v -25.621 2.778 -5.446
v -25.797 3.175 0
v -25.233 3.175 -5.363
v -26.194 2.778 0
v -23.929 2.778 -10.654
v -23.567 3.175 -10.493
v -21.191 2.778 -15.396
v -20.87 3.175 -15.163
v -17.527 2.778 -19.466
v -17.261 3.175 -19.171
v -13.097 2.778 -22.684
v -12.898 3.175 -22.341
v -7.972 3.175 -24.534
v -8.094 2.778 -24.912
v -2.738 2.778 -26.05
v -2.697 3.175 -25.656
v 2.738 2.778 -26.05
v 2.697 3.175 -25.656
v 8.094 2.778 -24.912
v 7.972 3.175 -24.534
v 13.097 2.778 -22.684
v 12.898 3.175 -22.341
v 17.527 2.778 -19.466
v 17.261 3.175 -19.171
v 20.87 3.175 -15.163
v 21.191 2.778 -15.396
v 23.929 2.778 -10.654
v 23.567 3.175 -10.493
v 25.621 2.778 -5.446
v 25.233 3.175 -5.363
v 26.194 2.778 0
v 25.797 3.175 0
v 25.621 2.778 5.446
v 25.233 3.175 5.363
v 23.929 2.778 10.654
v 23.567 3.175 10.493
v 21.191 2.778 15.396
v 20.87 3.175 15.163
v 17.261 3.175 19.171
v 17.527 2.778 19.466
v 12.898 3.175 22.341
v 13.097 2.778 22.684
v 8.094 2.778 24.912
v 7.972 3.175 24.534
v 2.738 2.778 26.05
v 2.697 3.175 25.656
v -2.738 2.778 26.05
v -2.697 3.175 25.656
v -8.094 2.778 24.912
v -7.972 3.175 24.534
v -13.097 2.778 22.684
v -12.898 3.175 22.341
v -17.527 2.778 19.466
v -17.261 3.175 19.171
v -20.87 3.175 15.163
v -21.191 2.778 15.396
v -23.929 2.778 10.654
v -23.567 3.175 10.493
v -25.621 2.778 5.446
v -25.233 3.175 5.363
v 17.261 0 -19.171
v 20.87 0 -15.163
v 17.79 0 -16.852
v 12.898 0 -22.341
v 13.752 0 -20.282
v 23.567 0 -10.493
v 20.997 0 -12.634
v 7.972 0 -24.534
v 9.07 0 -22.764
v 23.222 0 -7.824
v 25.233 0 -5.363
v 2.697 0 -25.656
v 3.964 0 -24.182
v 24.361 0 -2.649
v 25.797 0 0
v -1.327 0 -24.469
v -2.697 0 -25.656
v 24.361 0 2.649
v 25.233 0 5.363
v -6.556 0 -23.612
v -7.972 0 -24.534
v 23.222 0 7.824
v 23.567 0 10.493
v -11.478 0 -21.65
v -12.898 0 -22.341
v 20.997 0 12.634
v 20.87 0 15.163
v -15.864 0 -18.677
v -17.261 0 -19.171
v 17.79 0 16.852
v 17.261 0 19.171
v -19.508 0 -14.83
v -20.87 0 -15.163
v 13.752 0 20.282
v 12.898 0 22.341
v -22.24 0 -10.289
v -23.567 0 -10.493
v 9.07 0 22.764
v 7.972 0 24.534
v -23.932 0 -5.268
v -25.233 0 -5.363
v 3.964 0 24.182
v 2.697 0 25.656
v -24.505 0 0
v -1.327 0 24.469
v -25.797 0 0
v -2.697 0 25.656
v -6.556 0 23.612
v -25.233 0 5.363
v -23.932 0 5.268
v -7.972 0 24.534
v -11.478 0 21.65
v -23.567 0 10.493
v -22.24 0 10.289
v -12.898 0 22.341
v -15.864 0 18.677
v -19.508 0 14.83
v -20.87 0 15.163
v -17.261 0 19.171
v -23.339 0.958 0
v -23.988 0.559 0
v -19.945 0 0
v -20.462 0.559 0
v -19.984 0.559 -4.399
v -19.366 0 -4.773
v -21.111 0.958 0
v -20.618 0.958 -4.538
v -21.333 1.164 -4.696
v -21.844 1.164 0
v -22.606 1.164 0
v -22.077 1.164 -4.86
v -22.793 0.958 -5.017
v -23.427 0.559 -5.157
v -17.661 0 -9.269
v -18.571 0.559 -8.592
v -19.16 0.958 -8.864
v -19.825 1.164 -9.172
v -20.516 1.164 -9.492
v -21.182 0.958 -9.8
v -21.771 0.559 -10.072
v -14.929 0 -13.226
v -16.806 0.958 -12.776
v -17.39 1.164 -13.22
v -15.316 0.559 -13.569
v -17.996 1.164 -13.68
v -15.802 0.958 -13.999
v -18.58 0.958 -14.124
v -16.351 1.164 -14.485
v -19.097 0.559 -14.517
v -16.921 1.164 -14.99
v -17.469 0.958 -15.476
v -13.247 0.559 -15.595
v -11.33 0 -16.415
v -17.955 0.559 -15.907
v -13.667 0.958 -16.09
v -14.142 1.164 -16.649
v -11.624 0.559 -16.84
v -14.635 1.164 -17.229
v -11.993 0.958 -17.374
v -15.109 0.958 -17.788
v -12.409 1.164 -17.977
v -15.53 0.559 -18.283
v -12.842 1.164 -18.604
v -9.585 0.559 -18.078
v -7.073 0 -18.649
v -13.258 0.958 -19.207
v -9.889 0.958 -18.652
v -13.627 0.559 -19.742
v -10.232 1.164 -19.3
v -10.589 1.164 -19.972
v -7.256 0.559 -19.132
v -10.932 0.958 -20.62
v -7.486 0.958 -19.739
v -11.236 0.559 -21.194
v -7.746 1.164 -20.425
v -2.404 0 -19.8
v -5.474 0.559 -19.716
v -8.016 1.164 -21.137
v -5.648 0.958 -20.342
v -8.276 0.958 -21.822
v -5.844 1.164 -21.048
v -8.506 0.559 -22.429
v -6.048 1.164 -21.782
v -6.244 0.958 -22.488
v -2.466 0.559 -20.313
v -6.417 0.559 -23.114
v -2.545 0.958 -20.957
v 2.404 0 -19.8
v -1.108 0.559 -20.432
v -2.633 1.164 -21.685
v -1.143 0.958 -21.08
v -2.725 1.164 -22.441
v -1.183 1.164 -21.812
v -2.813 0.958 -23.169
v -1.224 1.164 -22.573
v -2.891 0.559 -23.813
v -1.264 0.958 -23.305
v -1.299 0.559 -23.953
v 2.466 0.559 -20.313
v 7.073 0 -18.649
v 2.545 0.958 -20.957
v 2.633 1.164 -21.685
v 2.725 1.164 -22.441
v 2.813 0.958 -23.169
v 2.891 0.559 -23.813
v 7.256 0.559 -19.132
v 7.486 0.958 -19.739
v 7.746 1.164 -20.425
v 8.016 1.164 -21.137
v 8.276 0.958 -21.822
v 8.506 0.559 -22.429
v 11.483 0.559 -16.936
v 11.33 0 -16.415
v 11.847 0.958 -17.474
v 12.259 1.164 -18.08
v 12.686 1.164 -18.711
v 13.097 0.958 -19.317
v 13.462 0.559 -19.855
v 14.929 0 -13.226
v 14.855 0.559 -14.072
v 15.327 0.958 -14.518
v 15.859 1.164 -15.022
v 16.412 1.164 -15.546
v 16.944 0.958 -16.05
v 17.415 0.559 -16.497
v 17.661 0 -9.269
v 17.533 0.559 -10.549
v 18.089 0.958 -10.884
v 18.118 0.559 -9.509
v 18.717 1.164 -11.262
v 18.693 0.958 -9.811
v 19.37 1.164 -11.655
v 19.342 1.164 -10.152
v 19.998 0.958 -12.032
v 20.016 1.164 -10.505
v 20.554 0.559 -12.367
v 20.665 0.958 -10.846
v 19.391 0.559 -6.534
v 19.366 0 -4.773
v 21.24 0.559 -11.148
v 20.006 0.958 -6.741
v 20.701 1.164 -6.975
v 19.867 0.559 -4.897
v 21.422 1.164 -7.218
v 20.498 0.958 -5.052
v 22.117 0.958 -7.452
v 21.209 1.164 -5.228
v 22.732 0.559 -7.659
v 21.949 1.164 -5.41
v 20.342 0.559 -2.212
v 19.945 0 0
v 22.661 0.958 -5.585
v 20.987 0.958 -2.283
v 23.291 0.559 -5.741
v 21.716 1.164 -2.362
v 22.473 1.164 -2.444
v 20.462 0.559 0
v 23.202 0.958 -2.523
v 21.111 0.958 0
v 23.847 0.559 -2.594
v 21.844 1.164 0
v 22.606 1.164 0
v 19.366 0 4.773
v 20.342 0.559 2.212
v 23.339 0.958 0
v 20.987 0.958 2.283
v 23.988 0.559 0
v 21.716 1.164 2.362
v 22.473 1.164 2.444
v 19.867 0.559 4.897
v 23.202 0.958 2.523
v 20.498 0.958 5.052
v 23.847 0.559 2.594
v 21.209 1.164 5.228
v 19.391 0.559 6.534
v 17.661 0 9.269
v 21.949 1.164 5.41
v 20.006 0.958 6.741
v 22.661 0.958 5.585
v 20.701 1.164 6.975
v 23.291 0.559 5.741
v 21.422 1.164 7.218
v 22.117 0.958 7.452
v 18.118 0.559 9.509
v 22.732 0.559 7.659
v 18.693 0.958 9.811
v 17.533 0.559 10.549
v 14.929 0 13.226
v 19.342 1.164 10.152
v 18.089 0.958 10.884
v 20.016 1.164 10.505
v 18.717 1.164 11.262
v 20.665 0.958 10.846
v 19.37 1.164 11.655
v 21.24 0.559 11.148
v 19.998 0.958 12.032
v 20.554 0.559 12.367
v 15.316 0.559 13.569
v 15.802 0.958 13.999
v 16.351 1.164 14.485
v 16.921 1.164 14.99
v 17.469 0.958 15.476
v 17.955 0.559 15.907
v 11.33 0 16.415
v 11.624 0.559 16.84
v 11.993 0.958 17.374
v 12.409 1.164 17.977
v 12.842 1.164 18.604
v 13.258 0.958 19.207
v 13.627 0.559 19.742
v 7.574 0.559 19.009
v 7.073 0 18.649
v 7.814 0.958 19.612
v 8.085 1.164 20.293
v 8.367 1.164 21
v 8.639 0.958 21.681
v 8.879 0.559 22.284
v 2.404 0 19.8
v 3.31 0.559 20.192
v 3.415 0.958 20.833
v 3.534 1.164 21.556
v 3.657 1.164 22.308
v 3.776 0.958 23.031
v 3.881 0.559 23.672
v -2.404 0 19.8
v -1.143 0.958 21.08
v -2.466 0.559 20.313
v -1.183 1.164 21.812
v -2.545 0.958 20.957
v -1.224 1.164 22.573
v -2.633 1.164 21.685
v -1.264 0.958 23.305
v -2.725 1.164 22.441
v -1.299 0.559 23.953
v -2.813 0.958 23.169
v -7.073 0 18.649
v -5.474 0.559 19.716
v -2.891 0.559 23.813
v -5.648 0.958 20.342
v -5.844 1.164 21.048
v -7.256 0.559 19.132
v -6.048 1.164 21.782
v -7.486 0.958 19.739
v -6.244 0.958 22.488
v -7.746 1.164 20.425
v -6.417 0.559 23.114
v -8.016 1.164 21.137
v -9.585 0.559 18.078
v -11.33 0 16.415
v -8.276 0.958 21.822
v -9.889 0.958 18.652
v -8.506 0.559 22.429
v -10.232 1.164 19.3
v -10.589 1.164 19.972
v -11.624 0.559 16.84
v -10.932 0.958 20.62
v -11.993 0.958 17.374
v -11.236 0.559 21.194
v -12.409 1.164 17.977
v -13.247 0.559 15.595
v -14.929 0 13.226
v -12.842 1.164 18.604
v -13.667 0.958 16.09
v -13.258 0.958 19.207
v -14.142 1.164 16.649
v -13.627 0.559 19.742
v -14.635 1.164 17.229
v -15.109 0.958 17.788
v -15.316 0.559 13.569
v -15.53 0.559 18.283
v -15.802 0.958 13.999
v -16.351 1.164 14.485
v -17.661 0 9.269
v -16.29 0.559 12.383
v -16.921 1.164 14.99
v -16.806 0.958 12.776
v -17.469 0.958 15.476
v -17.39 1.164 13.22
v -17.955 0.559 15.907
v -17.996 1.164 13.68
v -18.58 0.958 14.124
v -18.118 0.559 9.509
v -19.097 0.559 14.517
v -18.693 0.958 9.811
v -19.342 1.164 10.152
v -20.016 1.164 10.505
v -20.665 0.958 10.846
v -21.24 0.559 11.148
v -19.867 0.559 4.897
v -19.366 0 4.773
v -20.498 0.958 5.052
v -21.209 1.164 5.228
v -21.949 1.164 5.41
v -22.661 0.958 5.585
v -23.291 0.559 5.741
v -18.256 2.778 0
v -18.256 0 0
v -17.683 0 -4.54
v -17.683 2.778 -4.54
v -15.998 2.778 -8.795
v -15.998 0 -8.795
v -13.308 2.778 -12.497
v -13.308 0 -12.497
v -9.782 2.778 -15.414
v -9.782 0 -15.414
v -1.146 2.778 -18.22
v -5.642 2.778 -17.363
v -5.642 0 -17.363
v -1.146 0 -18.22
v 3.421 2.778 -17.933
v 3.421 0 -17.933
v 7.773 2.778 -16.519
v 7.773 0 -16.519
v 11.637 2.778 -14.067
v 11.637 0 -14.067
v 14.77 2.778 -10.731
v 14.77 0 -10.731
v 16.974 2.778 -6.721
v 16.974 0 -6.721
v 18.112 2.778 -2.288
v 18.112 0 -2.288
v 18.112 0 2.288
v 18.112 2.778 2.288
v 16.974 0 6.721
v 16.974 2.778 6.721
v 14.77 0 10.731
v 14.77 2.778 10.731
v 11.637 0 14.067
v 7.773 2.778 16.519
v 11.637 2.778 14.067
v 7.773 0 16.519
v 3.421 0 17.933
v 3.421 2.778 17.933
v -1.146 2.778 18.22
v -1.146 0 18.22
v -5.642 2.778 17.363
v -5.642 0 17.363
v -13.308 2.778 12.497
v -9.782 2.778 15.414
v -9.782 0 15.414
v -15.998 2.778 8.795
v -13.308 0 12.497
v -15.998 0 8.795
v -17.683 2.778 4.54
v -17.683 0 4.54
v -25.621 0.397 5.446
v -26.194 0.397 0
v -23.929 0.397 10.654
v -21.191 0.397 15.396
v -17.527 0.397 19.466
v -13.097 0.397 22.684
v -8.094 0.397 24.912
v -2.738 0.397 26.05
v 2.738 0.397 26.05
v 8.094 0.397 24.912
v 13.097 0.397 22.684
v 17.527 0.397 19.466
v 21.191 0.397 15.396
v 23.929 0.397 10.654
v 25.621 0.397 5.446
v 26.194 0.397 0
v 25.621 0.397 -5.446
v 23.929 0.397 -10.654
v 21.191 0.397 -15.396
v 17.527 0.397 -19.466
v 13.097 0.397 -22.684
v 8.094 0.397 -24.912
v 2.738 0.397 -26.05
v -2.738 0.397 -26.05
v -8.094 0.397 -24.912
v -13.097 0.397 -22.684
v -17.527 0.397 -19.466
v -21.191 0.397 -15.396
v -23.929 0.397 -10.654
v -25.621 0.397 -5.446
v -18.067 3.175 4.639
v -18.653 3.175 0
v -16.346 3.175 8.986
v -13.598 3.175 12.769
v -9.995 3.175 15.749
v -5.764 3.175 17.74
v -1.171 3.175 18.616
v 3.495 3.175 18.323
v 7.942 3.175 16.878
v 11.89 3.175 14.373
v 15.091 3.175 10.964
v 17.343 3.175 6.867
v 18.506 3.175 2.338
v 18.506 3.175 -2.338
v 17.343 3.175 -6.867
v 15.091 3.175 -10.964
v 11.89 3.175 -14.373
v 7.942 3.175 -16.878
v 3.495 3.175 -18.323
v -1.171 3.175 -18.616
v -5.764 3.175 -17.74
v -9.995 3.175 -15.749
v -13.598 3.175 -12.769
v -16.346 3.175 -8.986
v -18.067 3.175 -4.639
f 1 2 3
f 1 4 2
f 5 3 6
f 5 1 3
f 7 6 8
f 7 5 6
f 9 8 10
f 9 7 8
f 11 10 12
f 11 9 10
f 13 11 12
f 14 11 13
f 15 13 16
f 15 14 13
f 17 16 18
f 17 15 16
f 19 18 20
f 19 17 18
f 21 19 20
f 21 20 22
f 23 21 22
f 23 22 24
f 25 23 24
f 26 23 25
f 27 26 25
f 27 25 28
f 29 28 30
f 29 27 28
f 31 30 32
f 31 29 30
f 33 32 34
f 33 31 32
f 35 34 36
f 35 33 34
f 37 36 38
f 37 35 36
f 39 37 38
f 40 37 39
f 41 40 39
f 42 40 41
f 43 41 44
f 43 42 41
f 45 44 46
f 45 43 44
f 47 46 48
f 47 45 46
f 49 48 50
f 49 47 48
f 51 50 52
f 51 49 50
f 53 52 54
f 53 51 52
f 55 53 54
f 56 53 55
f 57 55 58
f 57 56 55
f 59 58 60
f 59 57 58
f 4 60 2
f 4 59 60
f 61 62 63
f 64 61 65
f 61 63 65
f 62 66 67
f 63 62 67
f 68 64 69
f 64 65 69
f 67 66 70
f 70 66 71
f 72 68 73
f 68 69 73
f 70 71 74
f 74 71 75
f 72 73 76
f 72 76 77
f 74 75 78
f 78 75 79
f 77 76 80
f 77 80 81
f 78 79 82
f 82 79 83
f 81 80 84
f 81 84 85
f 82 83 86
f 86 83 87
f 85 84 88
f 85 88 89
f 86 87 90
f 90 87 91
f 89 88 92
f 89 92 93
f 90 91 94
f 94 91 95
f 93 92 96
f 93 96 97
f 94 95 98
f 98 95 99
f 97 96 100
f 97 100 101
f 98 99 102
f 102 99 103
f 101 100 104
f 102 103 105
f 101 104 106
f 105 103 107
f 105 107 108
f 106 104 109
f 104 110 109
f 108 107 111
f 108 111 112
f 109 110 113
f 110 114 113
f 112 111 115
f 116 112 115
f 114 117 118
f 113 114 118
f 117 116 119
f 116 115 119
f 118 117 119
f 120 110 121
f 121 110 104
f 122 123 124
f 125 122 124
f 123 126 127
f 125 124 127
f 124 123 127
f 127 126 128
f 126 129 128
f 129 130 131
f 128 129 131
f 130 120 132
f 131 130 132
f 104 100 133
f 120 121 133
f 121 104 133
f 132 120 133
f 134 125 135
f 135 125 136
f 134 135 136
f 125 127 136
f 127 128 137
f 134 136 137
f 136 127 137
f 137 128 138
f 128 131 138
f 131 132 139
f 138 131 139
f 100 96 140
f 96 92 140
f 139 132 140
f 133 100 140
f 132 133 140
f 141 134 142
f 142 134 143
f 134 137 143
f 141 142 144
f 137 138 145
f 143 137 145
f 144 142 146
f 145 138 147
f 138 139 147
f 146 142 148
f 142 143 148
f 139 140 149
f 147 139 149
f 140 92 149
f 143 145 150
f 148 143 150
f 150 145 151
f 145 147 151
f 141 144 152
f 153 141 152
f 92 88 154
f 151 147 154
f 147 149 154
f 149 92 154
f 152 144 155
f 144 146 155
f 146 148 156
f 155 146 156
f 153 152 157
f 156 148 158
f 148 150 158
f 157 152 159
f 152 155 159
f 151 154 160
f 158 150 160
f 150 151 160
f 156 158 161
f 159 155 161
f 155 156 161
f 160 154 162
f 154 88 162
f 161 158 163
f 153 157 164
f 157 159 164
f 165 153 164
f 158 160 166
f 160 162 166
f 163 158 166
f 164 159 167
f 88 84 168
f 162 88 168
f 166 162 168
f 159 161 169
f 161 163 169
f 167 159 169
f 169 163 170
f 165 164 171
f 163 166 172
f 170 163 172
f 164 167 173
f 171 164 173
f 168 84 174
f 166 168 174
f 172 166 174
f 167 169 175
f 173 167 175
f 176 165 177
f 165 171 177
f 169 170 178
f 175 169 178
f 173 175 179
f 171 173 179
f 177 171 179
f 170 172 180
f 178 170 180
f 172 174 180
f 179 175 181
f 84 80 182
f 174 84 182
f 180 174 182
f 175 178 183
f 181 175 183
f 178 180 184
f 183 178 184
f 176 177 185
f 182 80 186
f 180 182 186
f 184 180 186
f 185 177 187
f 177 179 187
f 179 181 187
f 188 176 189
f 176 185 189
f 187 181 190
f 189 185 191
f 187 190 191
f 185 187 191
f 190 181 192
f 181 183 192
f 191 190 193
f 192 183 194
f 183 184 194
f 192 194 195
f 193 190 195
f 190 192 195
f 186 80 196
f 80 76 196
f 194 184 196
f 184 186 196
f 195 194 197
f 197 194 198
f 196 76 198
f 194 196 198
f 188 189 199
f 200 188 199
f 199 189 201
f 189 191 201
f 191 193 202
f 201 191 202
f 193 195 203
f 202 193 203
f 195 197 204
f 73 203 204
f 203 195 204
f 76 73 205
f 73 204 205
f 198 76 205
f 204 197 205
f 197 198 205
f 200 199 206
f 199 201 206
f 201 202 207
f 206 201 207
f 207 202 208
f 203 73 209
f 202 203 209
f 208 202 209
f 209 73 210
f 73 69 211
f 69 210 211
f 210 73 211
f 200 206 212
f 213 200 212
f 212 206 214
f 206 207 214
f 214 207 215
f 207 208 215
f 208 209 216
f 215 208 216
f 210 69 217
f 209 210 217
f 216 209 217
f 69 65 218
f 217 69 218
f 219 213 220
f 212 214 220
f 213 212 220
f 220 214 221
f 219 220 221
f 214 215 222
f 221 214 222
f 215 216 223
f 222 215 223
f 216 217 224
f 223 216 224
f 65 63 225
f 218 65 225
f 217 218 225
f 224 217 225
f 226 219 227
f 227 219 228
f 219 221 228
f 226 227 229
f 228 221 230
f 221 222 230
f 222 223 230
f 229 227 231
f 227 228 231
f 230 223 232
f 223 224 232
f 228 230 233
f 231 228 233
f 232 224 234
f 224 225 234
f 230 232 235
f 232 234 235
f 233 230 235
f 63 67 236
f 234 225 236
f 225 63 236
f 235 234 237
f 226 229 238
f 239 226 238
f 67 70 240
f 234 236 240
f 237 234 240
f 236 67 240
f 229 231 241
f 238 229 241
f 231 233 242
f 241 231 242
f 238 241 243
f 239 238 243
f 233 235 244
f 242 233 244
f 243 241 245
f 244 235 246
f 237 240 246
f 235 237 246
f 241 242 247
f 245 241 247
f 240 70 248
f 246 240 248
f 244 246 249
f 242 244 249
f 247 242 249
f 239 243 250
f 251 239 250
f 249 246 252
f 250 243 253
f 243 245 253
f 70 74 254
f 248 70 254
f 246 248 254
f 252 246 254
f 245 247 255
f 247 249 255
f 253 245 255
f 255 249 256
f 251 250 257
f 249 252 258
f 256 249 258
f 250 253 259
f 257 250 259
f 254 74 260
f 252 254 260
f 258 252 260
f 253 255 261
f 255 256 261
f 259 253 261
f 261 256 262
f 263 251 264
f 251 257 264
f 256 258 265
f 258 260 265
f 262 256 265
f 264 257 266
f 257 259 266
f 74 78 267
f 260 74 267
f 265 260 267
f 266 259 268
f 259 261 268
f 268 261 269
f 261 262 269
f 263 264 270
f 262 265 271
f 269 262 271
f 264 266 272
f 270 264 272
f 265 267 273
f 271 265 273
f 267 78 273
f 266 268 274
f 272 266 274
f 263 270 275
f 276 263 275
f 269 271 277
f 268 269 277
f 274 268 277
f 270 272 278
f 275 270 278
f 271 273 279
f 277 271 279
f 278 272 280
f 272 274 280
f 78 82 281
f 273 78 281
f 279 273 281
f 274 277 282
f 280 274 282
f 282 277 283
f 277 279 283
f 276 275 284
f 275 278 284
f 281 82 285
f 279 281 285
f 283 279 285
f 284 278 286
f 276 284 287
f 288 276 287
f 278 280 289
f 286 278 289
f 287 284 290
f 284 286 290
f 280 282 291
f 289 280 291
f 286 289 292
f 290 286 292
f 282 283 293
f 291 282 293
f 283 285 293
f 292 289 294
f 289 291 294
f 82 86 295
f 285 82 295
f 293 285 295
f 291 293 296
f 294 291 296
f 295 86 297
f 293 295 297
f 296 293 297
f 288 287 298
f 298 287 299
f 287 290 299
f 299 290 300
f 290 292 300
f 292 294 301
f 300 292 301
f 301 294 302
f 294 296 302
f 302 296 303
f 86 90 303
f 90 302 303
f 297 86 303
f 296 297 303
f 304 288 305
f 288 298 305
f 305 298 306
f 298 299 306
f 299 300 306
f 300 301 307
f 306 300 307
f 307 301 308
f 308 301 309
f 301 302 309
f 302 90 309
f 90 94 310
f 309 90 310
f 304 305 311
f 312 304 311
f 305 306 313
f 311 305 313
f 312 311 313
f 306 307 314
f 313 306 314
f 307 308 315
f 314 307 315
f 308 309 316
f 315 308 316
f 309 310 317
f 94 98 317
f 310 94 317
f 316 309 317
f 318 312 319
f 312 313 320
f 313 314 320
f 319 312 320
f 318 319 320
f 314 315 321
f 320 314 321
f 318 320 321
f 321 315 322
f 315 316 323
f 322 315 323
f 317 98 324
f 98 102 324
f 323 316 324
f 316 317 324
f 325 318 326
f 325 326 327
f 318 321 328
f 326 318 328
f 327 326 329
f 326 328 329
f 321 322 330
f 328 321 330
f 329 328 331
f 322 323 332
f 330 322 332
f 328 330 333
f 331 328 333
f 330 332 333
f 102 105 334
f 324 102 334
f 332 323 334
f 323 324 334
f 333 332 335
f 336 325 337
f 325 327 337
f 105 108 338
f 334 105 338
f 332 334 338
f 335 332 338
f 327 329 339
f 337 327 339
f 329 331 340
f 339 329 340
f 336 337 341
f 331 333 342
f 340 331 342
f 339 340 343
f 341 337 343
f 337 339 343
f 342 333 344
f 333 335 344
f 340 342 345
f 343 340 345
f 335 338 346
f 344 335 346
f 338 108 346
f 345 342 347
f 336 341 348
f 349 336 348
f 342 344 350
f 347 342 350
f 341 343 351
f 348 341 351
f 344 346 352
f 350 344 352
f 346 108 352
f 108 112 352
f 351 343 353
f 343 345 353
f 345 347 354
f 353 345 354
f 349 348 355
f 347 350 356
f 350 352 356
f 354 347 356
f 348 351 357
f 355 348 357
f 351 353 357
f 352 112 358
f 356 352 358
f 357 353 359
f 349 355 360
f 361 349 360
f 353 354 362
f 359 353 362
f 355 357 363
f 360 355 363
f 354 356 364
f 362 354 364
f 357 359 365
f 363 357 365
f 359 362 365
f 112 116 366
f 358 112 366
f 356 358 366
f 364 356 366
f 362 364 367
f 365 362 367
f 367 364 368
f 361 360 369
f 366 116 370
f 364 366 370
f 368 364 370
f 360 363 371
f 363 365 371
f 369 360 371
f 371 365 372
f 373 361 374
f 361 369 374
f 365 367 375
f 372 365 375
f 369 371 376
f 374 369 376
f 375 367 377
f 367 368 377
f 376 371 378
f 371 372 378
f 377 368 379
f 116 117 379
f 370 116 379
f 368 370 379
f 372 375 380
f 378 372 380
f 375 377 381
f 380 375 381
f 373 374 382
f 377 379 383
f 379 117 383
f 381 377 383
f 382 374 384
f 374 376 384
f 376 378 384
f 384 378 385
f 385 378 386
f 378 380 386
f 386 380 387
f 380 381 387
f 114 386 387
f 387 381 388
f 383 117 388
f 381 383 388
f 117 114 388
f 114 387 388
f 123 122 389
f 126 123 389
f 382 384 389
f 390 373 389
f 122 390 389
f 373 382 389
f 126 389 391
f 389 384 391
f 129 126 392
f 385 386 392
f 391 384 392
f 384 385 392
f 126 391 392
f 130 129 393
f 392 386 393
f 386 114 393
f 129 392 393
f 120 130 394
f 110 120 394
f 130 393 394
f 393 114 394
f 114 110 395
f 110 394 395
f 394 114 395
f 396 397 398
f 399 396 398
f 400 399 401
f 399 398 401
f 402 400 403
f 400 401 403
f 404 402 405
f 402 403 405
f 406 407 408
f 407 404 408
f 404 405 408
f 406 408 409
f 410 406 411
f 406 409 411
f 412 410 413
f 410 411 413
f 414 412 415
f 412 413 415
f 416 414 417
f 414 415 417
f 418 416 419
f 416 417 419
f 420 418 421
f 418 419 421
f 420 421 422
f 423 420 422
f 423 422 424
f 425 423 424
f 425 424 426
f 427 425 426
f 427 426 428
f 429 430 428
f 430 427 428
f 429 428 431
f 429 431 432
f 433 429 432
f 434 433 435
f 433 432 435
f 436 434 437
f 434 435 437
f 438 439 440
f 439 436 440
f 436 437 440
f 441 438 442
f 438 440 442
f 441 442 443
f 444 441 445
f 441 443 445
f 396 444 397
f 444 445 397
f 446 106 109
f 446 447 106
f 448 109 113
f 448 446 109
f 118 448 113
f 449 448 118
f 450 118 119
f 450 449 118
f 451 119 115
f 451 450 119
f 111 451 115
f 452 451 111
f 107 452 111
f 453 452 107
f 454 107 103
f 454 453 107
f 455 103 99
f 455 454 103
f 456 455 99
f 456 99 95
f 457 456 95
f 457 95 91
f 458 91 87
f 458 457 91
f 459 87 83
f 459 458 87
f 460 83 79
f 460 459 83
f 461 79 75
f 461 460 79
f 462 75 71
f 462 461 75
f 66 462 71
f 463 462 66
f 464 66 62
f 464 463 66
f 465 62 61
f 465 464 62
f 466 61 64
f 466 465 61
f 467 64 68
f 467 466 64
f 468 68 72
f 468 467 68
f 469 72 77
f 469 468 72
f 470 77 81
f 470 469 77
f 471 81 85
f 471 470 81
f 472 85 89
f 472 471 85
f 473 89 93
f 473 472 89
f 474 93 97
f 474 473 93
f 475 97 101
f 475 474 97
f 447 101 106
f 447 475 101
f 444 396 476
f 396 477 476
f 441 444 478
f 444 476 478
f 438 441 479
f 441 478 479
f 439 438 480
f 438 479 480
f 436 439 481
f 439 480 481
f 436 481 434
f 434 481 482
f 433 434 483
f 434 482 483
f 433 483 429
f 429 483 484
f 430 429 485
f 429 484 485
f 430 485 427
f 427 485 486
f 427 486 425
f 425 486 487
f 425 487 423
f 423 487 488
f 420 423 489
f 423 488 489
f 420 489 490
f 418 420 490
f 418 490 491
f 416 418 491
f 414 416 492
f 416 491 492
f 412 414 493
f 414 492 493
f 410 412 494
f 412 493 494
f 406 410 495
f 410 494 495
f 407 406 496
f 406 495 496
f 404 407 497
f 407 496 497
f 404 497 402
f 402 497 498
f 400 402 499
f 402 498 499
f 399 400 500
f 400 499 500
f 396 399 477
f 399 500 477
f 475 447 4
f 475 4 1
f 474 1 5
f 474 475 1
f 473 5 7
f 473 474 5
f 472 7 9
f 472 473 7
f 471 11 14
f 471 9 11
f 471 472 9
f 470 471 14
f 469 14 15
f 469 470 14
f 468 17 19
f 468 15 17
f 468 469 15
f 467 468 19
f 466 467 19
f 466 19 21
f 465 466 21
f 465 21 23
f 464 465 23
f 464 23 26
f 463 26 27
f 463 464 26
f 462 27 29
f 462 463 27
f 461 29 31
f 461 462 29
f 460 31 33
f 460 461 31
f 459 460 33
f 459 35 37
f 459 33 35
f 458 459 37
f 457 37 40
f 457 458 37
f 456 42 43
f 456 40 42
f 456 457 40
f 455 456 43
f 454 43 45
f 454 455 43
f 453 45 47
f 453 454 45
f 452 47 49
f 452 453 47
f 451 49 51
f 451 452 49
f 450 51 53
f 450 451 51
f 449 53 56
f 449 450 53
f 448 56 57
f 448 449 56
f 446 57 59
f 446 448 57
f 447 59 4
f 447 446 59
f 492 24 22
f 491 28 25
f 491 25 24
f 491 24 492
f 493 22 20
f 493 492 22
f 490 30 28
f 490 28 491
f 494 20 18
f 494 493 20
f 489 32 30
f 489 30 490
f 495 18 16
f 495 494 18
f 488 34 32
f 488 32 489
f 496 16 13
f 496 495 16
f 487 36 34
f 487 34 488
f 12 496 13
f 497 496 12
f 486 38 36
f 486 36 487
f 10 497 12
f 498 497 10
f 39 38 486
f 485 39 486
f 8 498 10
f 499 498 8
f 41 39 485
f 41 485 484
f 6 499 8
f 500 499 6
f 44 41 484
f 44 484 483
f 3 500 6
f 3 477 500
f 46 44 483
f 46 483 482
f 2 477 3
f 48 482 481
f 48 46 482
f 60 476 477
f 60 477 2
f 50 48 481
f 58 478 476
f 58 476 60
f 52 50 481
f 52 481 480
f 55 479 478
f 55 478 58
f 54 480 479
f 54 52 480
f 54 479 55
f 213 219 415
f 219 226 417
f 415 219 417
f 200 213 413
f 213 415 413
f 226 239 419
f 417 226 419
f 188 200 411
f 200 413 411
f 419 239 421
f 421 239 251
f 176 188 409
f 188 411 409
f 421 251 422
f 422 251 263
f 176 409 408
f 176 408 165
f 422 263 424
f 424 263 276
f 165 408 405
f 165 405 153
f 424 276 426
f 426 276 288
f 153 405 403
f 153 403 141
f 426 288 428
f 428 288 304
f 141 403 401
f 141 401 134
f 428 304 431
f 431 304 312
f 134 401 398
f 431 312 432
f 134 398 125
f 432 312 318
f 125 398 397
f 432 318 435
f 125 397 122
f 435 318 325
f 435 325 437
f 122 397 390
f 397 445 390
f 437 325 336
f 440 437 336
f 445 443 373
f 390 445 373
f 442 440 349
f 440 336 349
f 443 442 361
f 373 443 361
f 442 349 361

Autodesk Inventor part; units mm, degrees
ref_plane "YZ Plane" through (0, 0, 0) normal (1, 0, 0) x (0, 1, 0)
ref_plane "XZ Plane" through (0, 0, 0) normal (0, 1, 0) x (-1, 0, 0)
ref_plane "XY Plane" through (0, 0, 0) normal (0, 0, 1) x (1, 0, 0)
sketch "Sketch1" plane through (0, 0, 0) normal (0, 1, 0) x (-1, 0, 0)
  circle A0 centre (0, 0) radius 26.1938
  circle A1 centre (0, 0) radius 18.2563
  dimension "d0" = 52.3875
  dimension "d1" = 36.5125
extrude "Extrusion1" add sketch "Sketch1" along normal blind 3.175
sketch "Sketch2" plane through (0, 0, 0) normal (0, 0, 1) x (1, 0, 0)
  line L0 (-22.225, 0) -> (-22.225, -1.5875)
  circle A0 centre (-22.225, -1.5875) radius 2.7781
  line L1 (0, 0) -> (0, 3.175)
  line L2 (26.1938, 3.175) -> (-26.1938, 3.175) projected
  dimension "d4" = 1.5875
  dimension "d5" = 5.5563
revolve "Revolution1" cut sketch "Sketch2" angle 360 about axis through (0, 0, 0) along (0, 1, 0)
chamfer "Chamfer1" distance 0.3969 angle 45 1 edges at (26.1938, 3.175, 0)
chamfer "Chamfer2" distance 0.3969 angle 45 1 edges at (26.1938, 0, 0)
chamfer "Chamfer3" distance 0.3969 angle 45 1 edges at (18.2563, 3.175, 0)
properties part number "ThrustBearing-LowerRing"
